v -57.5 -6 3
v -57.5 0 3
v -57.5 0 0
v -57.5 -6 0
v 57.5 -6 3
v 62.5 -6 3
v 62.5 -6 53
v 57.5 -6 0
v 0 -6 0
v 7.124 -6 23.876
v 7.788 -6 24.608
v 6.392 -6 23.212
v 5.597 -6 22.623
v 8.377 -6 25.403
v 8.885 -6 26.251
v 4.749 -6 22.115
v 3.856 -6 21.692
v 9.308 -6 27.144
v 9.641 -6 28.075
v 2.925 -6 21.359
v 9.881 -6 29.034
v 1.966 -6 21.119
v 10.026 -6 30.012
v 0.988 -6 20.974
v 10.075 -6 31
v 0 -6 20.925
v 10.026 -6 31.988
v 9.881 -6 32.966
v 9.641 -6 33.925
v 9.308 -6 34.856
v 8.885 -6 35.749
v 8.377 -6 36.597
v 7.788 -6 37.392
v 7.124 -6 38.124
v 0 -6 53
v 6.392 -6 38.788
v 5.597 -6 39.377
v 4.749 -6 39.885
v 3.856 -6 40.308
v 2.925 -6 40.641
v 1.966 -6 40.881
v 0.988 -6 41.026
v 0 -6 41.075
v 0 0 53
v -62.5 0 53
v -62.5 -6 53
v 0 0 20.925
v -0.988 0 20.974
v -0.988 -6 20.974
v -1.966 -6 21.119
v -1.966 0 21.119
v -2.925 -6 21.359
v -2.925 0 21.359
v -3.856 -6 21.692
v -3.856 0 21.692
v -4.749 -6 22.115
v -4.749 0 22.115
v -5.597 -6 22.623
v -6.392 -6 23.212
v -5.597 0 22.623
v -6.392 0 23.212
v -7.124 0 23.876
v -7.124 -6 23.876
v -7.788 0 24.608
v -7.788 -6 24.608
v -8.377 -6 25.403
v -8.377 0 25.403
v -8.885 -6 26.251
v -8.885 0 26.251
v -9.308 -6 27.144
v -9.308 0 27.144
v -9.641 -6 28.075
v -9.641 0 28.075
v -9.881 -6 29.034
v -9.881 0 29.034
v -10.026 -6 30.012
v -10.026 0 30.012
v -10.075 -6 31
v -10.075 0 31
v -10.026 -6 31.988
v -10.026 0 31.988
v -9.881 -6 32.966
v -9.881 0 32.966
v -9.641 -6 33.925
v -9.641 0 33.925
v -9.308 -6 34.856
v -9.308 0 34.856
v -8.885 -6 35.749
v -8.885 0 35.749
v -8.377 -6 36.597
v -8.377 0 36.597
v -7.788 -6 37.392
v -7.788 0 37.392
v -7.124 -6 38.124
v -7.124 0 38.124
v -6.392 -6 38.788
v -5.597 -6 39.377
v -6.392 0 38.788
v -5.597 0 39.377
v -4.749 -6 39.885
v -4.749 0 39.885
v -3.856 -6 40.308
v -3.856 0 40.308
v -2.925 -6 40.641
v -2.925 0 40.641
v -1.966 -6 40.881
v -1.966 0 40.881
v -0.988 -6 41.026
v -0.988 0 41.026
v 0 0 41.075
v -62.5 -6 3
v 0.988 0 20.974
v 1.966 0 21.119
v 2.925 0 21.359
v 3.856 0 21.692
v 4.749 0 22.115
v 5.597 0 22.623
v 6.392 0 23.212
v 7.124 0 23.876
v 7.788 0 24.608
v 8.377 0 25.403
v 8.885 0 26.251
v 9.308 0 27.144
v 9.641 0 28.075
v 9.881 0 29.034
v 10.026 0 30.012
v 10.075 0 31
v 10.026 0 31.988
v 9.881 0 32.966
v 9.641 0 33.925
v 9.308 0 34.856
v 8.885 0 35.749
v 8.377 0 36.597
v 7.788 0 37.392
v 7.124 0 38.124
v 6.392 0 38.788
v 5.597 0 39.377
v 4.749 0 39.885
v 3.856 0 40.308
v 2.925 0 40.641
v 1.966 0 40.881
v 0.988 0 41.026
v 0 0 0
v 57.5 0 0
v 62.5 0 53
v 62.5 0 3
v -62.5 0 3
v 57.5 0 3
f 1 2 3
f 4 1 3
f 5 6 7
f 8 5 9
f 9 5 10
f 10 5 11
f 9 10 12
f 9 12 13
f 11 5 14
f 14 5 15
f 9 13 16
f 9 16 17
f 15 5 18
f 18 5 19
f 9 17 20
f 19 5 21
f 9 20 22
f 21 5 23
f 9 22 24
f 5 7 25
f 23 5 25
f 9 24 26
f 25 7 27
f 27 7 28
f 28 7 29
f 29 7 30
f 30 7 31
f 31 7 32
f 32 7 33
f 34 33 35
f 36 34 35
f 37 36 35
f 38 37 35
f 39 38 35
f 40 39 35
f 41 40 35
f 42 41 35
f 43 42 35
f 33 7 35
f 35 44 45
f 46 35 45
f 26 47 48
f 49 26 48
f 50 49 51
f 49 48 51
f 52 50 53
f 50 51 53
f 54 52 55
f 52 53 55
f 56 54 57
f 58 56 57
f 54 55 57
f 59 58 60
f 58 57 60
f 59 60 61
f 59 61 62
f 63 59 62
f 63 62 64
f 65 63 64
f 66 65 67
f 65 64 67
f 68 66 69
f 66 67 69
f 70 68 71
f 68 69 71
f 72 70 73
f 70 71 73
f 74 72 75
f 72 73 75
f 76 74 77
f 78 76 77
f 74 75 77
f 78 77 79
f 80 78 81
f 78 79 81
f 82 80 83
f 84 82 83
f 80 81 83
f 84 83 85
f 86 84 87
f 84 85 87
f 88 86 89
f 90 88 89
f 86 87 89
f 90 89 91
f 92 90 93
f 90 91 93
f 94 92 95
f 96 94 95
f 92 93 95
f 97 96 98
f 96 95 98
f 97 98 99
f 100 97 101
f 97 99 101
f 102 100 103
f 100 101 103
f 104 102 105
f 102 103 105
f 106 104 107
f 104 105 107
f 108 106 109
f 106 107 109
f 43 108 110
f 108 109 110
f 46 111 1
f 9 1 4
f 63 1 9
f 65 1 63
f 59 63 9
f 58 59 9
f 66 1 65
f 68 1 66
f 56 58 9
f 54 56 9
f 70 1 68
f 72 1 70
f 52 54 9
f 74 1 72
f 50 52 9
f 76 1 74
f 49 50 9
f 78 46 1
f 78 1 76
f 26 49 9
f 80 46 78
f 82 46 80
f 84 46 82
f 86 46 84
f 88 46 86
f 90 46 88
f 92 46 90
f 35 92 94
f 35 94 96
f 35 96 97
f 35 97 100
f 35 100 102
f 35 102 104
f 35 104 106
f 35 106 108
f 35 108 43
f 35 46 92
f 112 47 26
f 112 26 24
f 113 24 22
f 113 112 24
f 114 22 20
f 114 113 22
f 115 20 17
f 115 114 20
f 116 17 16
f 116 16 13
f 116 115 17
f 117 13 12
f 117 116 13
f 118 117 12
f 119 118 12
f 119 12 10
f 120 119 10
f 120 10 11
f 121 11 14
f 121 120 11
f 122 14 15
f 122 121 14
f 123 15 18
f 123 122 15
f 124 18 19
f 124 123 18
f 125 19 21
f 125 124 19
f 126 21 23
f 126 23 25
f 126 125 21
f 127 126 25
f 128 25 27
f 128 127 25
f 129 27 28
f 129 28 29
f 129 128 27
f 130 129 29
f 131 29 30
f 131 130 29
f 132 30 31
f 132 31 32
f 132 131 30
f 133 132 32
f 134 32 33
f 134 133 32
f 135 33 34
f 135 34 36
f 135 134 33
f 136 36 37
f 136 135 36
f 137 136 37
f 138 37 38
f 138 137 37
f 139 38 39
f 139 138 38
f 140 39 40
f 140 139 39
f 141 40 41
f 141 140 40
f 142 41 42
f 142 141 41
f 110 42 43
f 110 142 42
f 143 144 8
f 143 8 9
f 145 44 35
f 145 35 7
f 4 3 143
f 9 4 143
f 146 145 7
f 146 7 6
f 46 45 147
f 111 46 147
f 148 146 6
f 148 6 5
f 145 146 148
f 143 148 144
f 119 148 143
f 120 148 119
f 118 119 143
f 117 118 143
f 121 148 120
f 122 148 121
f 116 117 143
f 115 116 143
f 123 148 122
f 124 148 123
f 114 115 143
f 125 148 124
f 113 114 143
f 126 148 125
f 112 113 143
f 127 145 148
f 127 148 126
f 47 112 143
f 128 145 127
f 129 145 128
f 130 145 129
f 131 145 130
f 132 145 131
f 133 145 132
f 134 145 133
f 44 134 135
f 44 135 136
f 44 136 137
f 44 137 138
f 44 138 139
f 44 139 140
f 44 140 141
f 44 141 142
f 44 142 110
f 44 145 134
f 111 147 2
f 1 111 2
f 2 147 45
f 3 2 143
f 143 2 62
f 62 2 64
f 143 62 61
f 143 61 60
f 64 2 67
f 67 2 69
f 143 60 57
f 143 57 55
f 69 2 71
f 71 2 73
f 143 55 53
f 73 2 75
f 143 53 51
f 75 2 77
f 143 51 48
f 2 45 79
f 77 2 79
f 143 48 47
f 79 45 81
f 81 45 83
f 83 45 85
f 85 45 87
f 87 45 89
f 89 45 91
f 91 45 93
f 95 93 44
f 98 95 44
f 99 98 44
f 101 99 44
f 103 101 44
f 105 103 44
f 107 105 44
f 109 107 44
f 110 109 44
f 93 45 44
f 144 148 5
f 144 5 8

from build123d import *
from build123d import SkipClean  # not in build123d's __all__

# Parameters (mm, degrees)
F1_DEPTH = 6


with BuildPart() as f1:
    # F0 (on Front) → F1 (new body)
    with BuildSketch(Plane.XZ):
        with BuildLine():
            Line((-57.5, 0), (0, 0))
            Line((0, 0), (0, 20.925))
            ThreePointArc((0, 20.925), (-10.075, 31), (0, 41.075))
            Line((0, 41.075), (0, 53))
            Line((0, 53), (-62.5, 53))
            Line((-62.5, 53), (-62.5, 3))
            Line((-62.5, 3), (-57.5, 3))
            Line((-57.5, 3), (-57.5, 0))
        make_face()
    extrude(amount=F1_DEPTH)

    # F2: F1 across face


with BuildPart() as f1_1:
    add(f1.part, clean=False)
    with SkipClean():  # cleaning this boolean's faces spoils the solid; the shape is the same uncleaned
        add(f1.part.mirror(Plane(origin=(0, -3, 47.0375), x_dir=(0, 1, 0), z_dir=(1, 0, 0))), clean=False)


solid = f1_1.part
